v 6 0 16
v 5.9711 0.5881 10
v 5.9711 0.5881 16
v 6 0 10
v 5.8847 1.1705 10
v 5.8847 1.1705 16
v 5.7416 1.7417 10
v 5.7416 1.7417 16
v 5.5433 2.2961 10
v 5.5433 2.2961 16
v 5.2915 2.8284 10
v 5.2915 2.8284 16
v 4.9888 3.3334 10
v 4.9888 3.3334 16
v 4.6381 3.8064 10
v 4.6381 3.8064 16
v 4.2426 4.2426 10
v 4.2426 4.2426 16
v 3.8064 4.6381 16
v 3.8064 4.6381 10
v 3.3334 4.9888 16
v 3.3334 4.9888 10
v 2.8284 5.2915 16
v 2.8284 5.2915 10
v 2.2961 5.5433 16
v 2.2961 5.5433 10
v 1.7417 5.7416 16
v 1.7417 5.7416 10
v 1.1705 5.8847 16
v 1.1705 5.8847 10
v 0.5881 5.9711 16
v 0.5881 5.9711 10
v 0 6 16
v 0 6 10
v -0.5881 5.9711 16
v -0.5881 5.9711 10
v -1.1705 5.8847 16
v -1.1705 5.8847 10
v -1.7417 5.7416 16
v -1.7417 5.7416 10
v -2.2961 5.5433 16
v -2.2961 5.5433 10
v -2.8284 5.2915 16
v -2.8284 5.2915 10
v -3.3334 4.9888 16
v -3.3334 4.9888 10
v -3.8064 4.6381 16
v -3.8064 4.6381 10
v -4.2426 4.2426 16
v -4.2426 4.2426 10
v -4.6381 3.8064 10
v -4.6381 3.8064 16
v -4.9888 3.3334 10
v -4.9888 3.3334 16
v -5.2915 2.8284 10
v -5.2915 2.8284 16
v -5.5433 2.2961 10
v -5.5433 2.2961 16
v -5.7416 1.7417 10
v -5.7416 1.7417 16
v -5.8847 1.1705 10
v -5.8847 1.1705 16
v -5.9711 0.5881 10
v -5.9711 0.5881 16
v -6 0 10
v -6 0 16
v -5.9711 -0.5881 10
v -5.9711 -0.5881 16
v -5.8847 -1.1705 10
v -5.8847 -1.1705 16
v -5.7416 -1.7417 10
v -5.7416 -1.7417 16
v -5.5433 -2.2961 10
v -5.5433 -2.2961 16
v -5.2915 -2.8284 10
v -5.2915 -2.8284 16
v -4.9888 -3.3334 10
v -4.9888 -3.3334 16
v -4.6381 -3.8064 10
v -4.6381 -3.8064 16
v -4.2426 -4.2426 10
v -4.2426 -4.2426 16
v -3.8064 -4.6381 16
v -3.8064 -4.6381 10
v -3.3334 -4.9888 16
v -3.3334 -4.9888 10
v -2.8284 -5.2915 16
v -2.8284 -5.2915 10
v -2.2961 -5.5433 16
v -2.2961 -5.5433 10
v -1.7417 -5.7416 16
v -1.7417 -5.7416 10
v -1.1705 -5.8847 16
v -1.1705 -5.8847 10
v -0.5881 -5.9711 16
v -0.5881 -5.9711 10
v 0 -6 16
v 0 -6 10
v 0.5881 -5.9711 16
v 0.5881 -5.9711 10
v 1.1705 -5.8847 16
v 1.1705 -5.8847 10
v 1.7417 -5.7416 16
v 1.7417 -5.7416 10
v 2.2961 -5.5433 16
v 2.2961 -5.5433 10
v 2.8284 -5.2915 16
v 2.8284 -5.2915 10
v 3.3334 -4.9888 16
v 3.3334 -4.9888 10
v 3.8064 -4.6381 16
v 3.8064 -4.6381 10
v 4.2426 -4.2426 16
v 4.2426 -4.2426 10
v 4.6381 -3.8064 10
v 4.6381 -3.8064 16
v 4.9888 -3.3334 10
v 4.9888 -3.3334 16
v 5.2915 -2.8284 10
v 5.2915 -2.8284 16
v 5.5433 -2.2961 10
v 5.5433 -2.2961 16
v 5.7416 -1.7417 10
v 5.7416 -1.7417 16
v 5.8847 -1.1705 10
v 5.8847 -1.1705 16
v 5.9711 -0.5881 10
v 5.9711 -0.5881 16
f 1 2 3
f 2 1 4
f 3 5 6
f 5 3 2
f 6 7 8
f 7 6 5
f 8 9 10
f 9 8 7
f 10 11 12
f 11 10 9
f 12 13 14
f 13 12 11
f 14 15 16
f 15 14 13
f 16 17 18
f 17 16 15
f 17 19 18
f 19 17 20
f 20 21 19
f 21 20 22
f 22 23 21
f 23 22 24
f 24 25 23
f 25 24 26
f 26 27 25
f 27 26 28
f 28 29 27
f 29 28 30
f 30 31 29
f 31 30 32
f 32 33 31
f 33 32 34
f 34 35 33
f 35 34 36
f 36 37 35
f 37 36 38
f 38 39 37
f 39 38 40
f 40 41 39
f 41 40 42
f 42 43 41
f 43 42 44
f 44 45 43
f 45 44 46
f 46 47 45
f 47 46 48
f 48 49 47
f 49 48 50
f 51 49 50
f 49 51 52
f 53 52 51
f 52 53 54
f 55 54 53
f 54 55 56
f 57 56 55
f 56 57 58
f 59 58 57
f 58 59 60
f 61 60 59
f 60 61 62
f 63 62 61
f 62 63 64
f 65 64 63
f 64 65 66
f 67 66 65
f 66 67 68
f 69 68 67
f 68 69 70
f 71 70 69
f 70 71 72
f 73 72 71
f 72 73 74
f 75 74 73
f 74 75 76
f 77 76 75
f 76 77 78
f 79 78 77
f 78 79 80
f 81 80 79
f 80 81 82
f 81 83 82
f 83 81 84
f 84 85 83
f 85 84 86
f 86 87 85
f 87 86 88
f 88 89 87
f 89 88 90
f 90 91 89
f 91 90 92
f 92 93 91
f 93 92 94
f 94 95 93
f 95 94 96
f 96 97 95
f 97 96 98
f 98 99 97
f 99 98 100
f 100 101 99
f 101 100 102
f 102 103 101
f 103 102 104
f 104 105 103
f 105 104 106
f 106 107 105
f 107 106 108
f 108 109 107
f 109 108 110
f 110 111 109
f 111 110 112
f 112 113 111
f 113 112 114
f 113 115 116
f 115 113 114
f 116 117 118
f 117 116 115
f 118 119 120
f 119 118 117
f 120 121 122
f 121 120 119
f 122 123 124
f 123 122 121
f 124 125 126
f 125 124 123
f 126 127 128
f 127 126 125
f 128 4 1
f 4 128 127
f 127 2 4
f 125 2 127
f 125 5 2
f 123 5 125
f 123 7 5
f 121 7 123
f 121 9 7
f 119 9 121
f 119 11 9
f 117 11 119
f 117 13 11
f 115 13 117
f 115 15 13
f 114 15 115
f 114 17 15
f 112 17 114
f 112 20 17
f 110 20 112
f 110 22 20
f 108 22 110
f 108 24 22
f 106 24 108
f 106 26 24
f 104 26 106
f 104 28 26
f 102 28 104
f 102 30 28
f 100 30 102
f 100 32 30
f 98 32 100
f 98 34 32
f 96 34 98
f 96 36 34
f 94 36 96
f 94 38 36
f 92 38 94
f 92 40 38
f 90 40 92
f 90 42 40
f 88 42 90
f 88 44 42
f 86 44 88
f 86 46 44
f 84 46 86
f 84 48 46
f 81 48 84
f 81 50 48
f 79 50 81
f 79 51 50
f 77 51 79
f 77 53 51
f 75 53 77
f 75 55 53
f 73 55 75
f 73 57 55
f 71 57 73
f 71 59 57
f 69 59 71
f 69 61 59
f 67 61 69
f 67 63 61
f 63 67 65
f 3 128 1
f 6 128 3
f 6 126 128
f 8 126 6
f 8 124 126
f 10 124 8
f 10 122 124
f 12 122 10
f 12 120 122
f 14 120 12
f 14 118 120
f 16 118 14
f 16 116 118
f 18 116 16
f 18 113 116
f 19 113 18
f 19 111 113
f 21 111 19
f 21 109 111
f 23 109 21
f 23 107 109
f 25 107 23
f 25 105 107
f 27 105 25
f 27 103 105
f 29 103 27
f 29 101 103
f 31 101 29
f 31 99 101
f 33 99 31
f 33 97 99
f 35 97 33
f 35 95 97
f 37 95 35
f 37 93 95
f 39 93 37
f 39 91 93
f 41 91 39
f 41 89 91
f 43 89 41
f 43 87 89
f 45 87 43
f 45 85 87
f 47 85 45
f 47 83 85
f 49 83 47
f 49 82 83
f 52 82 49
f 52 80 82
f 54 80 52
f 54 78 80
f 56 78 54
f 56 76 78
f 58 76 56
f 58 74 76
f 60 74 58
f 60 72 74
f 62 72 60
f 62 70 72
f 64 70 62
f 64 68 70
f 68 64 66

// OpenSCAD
// Dimensions in mm
inner_diameter_8mm = 8;
outer_diameter_8mm_start = 7.5;
outer_diameter_8mm_end = 9.5;
barb_height_8mm = 10;
total_length_barbs_8mm = 20;

inner_diameter_5mm = 5;
outer_diameter_5mm_start = 6.5;
outer_diameter_5mm_end = 5.0;
barb_height_5mm = 8;
total_length_barbs_5mm = 16;

collar_diameter = 12;

// Print orientation
translate([0, 0, -10]) {
    // Reducer body
    translate([0, 0, 0])
        linear_extrude(41)
            union() {
                // Inner hole
                cylinder(h=41, d=inner_diameter_8mm, $fn=64);
                
                // Outer wall
                circle(d=outer_diameter_8mm_start, h=barb_height_8mm, $fn=64);
                translate([0, 0, barb_height_8mm])
                    circle(d=outer_diameter_8mm_end, h=barb_height_8mm, $fn=64);
                translate([0, 0, 2*barb_height_8mm])
                    circle(d=outer_diameter_8mm_start, h=barb_height_8mm, $fn=64);
                
                // Sawtooth profile
                for (x = [0, outer_diameter_8mm_end - outer_diameter_8mm_start]) {
                    translate([x, 0])
                        circle(d=x, h=barb_height_8mm, $fn=64);
                }
            }
            
    // Barbs for 8 mm tubing
    for (z = [0, total_length_barbs_8mm]) {
        if (z == 0) {
            translate([0, 0, z])
                rotate_extrude([90, 0, 0], angle=180)
                    polygon(points=[[0, 0], [outer_diameter_8mm_start, 0], [outer_diameter_8mm_end, barb_height_8mm], [0, barb_height_8mm]]);
        } else {
            translate([0, 0, z])
                rotate_extrude([90, 0, 0], angle=180)
                    polygon(points=[[0, 0], [outer_diameter_8mm_start + (z - total_length_barbs_8mm) * (outer_diameter_8mm_end - outer_diameter_8mm_start)/(barb_height_8mm), 0], [outer_diameter_8mm_end, barb_height_8mm], [0, barb_height_8mm]]);
        }
    }
    
    // Collar
    translate([0, 0, total_length_barbs_8mm])
        cylinder(h=collar_diameter/2, d=collar_diameter, $fn=64);
}

// Barbs for 5 mm tubing
for (z = [20, total_length_barbs_5mm + 25]) {
    if (z == 20) {
        translate([0, 0, z])
            rotate_extrude([90, 0, 0], angle=180)
                polygon(points=[[0, 0], [outer_diameter_5mm_start, 0], [outer_diameter_5mm_end, barb_height_5mm], [0, barb_height_5mm]]);
    } else {
        translate([0, 0, z])
            rotate_extrude([90, 0, 0], angle=180)
                polygon(points=[[0, 0], [outer_diameter_5mm_start + (z - total_length_barbs_5mm) * (outer_diameter_5mm_end - outer_diameter_5mm_start)/(barb_height_5mm), 0], [outer_diameter_5mm_end, barb_height_5mm], [0, barb_height_5mm]]);
    }
}

// Barbs for 5 mm tubing (second set)
for (z = [25, total_length_barbs_5mm]) {
    if (z == 25) {
        translate([0, 0, z])
            rotate_extrude([90, 0, 0], angle=180)
                polygon(points=[[0, 0], [outer_diameter_5mm_start, 0], [outer_diameter_5mm_end, barb_height_5mm], [0, barb_height_5mm]]);
    } else {
        translate([0, 0, z])
            rotate_extrude([90, 0, 0], angle=180)
                polygon(points=[[0, 0], [outer_diameter_5mm_start + (z - total_length_barbs_5mm) * (outer_diameter_5mm_end - outer_diameter_5mm_start)/(barb_height_5mm), 0], [outer_diameter_5mm_end, barb_height_5mm], [0, barb_height_5mm]]);
    }
}
